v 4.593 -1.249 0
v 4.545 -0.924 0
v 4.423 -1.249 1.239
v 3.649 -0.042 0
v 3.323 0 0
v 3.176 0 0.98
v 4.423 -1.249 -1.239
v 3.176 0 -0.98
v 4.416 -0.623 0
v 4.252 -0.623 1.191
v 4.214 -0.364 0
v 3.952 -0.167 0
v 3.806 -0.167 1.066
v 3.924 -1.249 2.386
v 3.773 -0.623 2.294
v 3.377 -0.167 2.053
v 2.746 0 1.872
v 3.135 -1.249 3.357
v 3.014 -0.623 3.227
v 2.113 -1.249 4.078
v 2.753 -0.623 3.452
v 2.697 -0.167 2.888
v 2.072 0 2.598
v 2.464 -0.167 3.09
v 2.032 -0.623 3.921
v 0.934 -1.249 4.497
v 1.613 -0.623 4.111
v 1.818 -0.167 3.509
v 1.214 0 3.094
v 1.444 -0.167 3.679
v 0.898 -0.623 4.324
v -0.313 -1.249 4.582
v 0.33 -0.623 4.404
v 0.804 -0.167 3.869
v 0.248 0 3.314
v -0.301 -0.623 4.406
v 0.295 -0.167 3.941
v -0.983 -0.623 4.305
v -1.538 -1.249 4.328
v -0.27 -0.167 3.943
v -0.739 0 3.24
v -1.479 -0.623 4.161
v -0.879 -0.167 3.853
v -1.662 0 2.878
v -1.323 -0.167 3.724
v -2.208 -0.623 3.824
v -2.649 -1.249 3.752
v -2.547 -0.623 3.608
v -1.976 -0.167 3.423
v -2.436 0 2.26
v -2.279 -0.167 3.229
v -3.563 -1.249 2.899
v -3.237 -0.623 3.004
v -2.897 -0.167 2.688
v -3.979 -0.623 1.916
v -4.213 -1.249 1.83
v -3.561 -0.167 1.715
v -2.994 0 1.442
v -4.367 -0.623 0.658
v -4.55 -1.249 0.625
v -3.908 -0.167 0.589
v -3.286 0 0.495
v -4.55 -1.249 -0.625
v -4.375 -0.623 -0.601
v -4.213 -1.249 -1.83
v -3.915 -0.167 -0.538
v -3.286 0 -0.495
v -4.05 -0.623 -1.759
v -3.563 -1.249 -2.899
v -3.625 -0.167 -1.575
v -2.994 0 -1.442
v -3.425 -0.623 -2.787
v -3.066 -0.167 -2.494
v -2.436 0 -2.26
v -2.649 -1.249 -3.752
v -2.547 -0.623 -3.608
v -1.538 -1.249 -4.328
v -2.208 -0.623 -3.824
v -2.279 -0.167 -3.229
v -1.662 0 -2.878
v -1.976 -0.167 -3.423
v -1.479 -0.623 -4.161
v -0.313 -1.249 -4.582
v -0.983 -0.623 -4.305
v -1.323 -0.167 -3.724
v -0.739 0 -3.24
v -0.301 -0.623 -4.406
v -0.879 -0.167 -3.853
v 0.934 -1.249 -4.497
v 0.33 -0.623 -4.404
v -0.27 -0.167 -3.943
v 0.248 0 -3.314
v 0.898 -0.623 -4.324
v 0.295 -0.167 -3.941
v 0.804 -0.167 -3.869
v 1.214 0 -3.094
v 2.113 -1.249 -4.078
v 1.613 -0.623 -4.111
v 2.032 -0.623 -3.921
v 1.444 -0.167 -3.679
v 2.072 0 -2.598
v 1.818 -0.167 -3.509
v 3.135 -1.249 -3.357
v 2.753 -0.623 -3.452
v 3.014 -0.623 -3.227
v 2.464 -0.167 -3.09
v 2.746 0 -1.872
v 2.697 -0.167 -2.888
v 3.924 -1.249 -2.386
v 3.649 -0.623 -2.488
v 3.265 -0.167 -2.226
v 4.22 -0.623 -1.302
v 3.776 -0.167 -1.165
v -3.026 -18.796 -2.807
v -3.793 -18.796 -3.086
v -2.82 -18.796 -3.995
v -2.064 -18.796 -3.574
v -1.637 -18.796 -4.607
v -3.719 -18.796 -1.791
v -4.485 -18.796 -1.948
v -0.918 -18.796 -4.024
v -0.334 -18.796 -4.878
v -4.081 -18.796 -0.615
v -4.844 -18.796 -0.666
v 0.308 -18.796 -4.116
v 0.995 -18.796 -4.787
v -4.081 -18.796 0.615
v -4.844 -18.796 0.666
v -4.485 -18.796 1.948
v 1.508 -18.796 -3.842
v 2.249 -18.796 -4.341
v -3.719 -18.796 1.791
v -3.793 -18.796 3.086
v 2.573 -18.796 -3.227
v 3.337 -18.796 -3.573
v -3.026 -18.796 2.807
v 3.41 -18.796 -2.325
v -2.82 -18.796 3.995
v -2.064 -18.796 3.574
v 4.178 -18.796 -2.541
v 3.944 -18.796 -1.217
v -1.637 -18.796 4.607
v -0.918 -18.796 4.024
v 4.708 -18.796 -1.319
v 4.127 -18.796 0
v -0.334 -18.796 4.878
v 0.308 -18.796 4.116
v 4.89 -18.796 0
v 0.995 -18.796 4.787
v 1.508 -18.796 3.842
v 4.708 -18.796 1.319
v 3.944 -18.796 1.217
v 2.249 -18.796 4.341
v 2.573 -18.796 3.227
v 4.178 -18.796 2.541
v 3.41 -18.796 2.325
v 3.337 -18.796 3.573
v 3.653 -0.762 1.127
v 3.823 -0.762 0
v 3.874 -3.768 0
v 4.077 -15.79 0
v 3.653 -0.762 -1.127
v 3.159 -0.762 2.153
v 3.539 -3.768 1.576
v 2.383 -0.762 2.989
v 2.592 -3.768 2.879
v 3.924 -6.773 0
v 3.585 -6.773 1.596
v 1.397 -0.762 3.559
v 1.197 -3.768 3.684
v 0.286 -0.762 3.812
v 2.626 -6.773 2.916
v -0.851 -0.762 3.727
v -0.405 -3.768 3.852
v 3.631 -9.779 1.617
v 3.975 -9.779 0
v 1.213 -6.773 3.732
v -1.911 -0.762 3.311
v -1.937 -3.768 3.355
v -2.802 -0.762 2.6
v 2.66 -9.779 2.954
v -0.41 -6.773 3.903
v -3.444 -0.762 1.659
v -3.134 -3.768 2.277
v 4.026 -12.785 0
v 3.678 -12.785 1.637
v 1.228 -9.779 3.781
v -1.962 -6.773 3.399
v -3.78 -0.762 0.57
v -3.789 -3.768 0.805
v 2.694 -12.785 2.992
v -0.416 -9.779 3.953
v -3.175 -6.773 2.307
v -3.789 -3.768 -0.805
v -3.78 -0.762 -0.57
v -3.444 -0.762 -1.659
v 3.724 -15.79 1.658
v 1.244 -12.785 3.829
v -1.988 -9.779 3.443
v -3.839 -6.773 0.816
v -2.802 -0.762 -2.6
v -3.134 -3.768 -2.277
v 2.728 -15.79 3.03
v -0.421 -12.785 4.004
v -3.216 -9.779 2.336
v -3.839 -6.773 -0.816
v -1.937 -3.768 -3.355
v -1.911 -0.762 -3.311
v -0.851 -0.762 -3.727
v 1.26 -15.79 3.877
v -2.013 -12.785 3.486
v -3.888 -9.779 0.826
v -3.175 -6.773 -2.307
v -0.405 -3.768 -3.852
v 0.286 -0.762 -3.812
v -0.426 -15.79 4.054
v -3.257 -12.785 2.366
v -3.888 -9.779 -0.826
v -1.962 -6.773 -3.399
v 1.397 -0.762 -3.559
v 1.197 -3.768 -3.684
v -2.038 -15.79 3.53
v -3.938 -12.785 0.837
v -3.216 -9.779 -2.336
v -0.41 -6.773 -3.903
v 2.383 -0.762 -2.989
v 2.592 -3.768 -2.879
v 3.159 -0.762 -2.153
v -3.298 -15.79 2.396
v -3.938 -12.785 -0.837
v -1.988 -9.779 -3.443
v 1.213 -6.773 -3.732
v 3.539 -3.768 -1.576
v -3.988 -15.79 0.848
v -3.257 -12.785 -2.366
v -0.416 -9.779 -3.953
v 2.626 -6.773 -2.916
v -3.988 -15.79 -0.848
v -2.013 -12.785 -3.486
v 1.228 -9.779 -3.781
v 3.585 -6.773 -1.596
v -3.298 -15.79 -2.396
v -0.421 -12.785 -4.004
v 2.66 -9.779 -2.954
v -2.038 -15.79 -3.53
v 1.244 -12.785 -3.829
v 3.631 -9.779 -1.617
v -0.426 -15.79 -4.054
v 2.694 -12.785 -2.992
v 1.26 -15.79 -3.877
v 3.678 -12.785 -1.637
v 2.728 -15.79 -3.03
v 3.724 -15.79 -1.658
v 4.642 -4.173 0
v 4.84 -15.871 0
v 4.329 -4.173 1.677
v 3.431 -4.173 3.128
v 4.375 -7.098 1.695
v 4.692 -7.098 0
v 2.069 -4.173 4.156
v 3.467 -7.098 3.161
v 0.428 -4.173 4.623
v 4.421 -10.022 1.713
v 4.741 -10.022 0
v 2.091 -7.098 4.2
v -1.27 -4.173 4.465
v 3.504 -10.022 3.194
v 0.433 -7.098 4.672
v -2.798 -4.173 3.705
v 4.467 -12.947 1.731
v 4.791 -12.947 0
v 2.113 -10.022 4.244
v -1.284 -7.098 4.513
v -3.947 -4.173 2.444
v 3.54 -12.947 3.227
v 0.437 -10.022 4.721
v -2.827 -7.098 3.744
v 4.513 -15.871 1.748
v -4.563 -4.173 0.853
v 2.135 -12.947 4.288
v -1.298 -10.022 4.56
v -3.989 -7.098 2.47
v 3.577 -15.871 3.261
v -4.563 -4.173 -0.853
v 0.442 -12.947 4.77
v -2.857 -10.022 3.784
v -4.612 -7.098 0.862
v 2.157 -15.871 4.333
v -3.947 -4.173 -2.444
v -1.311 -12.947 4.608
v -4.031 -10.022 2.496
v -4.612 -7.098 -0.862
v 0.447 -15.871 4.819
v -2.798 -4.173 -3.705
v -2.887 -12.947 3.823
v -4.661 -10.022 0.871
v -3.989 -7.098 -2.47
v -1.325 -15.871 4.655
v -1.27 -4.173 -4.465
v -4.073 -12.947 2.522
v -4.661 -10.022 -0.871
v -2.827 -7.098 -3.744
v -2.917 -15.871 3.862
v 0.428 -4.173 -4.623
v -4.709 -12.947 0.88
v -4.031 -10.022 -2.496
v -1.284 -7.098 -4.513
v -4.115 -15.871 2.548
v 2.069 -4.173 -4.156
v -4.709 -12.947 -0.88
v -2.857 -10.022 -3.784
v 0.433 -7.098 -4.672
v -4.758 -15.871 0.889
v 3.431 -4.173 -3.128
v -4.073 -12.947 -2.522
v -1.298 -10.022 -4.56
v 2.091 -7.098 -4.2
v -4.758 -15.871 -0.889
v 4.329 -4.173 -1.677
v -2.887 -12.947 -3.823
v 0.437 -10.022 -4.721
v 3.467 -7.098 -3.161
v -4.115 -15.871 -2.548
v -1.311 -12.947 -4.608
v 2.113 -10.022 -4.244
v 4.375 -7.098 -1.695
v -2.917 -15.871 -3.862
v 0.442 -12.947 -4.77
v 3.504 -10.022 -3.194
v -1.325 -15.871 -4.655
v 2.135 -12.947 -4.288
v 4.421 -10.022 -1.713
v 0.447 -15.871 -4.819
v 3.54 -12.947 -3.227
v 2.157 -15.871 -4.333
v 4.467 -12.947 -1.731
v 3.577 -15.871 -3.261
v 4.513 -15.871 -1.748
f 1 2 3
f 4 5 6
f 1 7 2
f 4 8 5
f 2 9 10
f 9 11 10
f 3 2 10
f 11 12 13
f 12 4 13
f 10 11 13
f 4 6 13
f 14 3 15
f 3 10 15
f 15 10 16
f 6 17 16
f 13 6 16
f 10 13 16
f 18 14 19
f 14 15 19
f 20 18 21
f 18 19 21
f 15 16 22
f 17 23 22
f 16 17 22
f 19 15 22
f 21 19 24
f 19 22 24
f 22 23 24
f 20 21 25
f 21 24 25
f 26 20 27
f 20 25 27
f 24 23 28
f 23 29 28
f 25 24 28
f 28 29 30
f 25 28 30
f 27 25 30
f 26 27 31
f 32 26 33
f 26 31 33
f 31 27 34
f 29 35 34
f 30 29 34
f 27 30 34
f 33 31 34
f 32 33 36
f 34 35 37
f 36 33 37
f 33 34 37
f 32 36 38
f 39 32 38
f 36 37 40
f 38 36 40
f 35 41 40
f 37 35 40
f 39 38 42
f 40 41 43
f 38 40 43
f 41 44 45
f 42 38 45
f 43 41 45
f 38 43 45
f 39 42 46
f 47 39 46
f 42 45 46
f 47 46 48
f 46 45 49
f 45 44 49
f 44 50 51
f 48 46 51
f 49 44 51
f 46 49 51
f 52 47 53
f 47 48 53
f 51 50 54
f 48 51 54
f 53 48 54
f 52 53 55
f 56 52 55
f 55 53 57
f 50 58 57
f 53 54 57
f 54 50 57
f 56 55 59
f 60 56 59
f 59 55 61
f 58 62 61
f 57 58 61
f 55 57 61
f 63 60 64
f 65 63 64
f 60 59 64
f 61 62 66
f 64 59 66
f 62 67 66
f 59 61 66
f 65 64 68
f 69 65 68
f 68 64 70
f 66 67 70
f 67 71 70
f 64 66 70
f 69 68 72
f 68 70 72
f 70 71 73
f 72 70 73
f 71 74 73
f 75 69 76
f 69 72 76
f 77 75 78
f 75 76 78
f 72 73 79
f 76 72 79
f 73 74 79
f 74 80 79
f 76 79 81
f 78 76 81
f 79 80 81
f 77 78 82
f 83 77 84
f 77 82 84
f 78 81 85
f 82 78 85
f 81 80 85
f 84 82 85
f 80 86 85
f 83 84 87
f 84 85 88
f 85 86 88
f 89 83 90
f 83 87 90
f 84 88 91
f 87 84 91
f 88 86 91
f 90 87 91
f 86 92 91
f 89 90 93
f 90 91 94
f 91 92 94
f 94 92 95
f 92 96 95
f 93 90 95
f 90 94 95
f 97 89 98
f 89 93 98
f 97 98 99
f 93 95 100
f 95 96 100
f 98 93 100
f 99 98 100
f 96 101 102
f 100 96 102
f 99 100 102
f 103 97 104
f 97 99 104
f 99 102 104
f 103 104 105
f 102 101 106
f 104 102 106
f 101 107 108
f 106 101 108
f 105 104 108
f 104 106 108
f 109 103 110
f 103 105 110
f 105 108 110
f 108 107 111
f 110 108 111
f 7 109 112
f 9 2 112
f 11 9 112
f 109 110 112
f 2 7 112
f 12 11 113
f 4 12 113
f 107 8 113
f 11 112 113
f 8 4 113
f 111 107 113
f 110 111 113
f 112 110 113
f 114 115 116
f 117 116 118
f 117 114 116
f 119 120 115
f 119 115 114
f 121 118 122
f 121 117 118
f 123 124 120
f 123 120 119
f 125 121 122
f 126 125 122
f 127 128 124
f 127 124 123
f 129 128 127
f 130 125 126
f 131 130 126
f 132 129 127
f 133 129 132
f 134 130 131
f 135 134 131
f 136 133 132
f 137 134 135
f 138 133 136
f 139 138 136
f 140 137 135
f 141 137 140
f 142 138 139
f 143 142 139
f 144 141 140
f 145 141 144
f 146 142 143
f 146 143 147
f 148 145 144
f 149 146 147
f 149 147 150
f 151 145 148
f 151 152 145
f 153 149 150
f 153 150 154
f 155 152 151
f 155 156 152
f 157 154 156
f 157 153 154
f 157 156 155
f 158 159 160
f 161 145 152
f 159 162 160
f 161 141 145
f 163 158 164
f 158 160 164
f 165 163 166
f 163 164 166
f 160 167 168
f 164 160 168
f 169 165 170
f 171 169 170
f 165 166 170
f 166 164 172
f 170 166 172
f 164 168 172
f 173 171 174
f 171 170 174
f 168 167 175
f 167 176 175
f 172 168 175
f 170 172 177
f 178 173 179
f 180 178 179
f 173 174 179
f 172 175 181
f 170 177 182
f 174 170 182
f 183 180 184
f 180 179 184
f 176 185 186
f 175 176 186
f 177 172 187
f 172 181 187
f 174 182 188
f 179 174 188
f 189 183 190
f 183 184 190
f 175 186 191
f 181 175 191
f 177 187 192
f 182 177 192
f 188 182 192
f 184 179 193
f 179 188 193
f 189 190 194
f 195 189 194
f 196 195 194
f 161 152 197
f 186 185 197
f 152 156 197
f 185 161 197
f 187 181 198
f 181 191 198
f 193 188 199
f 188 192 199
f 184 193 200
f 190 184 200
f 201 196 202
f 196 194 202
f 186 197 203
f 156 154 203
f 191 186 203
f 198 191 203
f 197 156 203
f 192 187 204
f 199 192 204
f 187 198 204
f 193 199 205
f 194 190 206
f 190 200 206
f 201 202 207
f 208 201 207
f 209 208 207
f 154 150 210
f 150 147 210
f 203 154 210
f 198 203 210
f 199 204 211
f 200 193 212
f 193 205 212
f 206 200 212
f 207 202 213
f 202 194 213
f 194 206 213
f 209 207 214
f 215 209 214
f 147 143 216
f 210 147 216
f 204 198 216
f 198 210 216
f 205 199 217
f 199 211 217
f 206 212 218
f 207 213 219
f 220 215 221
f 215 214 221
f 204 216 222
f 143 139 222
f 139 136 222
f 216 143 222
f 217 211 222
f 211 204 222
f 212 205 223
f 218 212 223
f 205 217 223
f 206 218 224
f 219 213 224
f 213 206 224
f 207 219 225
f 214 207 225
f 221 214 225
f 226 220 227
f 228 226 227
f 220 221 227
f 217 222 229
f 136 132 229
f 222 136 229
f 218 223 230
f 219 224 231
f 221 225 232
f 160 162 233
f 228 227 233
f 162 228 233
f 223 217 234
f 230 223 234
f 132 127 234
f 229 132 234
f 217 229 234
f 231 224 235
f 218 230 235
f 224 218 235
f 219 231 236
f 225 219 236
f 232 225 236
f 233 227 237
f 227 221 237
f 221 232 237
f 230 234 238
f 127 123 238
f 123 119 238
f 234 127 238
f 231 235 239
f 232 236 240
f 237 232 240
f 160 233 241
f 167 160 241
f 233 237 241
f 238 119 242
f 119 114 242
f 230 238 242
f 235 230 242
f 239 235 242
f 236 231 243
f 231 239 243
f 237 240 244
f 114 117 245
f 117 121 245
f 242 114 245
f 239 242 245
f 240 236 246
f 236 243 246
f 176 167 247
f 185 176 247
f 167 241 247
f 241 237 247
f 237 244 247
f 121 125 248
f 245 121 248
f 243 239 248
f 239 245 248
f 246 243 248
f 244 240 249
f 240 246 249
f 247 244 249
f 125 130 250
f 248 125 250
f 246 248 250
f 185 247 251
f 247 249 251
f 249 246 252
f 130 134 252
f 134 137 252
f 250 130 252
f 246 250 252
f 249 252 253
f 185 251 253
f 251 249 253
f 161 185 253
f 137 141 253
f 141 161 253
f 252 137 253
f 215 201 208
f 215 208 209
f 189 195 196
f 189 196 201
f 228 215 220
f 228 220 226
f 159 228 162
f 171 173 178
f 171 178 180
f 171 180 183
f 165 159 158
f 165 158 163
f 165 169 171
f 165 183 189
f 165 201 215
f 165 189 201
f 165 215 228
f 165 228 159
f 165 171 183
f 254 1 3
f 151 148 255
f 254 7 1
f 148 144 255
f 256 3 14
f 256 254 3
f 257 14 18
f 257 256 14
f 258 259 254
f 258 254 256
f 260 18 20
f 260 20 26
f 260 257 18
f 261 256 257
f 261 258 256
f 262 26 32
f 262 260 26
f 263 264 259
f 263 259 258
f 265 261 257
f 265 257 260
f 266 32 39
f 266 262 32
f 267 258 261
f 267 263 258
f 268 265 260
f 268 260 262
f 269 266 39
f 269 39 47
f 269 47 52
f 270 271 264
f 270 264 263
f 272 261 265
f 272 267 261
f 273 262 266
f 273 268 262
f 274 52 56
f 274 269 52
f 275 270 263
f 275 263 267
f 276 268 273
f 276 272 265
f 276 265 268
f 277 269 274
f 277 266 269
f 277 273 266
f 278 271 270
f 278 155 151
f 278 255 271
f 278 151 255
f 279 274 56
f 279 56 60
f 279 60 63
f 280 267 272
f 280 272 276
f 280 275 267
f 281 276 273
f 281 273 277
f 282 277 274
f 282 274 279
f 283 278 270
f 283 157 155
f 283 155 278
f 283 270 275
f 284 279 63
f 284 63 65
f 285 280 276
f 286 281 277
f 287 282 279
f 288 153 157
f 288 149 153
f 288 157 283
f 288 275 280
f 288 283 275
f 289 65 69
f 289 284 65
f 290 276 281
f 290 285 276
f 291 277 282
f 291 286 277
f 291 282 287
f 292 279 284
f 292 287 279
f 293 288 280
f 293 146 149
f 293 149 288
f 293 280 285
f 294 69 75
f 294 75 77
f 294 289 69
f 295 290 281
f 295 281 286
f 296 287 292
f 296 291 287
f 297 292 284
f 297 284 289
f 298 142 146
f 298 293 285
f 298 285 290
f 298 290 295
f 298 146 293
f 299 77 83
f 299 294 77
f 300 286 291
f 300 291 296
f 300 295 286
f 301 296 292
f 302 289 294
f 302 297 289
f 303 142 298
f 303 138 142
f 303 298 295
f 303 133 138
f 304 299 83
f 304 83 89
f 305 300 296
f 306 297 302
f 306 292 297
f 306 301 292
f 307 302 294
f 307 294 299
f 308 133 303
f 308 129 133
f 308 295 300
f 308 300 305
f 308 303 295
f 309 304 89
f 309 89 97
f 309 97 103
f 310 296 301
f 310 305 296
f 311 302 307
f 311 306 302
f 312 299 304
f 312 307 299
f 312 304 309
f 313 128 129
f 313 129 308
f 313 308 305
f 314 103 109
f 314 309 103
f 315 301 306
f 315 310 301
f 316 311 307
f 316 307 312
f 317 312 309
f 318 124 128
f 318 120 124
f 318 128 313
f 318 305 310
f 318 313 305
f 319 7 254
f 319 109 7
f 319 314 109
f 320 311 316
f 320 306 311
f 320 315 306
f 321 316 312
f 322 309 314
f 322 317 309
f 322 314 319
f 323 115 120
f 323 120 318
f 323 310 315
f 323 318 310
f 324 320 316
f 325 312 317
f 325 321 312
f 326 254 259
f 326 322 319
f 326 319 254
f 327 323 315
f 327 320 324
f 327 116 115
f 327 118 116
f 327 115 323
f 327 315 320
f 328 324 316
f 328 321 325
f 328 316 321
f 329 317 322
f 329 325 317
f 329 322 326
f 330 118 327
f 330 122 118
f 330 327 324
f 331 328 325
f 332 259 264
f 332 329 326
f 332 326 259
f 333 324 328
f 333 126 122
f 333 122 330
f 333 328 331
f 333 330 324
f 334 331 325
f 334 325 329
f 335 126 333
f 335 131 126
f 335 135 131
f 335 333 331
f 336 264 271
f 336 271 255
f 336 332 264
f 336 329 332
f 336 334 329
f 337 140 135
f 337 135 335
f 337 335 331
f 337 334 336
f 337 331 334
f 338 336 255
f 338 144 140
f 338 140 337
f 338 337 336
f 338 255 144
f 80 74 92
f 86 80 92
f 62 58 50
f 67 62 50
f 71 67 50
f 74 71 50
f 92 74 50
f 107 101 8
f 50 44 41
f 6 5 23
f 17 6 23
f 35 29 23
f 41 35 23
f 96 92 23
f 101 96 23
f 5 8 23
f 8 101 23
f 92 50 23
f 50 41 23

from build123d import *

# Parameters (mm, degrees)
F0_R = 4.572
F2_R = 4.8895
F4_T = -0.762
F5_R = 1.27


with BuildPart() as f3:
    # F0 (on Front) → F3 section 0
    with BuildSketch(Plane.XZ):
        Circle(F0_R)
    # F2 (on offset) → F3 section 1
    with BuildSketch(Plane.XZ.offset(18.796)):
        Circle(F2_R)
    loft()

    # F4
    f4_openings = [f3.faces().sort_by_distance(p)[0] for p in [
        (0, -18.796, 0),
    ]]
    offset(amount=F4_T, openings=f4_openings, kind=Kind.INTERSECTION)

    # F5
    f5_edges = [f3.edges().sort_by_distance(p)[0] for p in [
        (-4.572, 0, 0),
    ]]
    fillet(f5_edges, radius=F5_R)


solid = f3.part
